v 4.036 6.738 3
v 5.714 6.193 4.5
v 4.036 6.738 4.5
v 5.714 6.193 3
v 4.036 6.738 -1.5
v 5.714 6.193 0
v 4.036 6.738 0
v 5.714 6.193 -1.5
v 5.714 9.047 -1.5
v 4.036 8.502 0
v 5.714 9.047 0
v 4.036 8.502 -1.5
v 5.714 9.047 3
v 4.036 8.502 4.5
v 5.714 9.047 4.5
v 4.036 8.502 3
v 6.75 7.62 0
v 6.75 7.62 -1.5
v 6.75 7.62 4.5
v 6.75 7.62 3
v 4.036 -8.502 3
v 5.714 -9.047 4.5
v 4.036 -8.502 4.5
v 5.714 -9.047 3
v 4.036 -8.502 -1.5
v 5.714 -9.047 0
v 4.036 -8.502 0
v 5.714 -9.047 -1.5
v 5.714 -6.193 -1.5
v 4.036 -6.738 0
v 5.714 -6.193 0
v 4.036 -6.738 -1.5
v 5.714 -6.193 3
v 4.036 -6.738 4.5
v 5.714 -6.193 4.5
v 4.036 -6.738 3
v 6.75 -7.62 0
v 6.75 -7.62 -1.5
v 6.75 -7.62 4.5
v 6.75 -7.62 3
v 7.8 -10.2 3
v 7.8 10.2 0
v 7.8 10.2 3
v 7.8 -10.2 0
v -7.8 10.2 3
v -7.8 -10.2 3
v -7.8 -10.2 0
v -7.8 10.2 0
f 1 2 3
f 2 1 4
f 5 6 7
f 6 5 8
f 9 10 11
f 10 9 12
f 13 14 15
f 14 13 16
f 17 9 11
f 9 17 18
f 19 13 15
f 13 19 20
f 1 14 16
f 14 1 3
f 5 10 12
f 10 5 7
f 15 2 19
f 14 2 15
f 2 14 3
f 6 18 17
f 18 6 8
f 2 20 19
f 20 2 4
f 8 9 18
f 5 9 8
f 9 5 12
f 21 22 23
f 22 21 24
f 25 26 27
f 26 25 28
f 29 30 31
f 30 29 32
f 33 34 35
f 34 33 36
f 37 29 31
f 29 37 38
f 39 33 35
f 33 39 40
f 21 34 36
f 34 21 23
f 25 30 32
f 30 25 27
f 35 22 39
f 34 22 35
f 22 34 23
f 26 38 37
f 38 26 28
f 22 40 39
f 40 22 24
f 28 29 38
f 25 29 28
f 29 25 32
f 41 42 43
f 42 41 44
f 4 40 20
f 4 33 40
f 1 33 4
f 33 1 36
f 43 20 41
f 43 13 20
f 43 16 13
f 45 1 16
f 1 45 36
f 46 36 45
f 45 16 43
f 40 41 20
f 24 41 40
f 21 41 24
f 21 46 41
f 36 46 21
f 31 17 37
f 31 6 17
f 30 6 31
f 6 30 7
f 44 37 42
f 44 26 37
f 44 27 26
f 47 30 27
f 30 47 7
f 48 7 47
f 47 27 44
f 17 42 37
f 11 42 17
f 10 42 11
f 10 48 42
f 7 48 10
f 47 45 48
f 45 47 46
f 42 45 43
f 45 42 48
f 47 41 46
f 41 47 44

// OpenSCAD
module GY521Holes() {
    height = 20.4;
    width = 15.6;
    
    cylinder(h = 6, r = 1.5, center = true);
    
    
    
}

module GY521() {
    height = 20.4;
    width = 15.6;
    
    translate([0,0,1.5])
    union() {
        cube([width, height, 3],center = true);
        for (i=[1,-1])
        translate([13.05-width/2,15.24/2*i,0])
        GY521Holes();
    }
    
    
}

GY521();
